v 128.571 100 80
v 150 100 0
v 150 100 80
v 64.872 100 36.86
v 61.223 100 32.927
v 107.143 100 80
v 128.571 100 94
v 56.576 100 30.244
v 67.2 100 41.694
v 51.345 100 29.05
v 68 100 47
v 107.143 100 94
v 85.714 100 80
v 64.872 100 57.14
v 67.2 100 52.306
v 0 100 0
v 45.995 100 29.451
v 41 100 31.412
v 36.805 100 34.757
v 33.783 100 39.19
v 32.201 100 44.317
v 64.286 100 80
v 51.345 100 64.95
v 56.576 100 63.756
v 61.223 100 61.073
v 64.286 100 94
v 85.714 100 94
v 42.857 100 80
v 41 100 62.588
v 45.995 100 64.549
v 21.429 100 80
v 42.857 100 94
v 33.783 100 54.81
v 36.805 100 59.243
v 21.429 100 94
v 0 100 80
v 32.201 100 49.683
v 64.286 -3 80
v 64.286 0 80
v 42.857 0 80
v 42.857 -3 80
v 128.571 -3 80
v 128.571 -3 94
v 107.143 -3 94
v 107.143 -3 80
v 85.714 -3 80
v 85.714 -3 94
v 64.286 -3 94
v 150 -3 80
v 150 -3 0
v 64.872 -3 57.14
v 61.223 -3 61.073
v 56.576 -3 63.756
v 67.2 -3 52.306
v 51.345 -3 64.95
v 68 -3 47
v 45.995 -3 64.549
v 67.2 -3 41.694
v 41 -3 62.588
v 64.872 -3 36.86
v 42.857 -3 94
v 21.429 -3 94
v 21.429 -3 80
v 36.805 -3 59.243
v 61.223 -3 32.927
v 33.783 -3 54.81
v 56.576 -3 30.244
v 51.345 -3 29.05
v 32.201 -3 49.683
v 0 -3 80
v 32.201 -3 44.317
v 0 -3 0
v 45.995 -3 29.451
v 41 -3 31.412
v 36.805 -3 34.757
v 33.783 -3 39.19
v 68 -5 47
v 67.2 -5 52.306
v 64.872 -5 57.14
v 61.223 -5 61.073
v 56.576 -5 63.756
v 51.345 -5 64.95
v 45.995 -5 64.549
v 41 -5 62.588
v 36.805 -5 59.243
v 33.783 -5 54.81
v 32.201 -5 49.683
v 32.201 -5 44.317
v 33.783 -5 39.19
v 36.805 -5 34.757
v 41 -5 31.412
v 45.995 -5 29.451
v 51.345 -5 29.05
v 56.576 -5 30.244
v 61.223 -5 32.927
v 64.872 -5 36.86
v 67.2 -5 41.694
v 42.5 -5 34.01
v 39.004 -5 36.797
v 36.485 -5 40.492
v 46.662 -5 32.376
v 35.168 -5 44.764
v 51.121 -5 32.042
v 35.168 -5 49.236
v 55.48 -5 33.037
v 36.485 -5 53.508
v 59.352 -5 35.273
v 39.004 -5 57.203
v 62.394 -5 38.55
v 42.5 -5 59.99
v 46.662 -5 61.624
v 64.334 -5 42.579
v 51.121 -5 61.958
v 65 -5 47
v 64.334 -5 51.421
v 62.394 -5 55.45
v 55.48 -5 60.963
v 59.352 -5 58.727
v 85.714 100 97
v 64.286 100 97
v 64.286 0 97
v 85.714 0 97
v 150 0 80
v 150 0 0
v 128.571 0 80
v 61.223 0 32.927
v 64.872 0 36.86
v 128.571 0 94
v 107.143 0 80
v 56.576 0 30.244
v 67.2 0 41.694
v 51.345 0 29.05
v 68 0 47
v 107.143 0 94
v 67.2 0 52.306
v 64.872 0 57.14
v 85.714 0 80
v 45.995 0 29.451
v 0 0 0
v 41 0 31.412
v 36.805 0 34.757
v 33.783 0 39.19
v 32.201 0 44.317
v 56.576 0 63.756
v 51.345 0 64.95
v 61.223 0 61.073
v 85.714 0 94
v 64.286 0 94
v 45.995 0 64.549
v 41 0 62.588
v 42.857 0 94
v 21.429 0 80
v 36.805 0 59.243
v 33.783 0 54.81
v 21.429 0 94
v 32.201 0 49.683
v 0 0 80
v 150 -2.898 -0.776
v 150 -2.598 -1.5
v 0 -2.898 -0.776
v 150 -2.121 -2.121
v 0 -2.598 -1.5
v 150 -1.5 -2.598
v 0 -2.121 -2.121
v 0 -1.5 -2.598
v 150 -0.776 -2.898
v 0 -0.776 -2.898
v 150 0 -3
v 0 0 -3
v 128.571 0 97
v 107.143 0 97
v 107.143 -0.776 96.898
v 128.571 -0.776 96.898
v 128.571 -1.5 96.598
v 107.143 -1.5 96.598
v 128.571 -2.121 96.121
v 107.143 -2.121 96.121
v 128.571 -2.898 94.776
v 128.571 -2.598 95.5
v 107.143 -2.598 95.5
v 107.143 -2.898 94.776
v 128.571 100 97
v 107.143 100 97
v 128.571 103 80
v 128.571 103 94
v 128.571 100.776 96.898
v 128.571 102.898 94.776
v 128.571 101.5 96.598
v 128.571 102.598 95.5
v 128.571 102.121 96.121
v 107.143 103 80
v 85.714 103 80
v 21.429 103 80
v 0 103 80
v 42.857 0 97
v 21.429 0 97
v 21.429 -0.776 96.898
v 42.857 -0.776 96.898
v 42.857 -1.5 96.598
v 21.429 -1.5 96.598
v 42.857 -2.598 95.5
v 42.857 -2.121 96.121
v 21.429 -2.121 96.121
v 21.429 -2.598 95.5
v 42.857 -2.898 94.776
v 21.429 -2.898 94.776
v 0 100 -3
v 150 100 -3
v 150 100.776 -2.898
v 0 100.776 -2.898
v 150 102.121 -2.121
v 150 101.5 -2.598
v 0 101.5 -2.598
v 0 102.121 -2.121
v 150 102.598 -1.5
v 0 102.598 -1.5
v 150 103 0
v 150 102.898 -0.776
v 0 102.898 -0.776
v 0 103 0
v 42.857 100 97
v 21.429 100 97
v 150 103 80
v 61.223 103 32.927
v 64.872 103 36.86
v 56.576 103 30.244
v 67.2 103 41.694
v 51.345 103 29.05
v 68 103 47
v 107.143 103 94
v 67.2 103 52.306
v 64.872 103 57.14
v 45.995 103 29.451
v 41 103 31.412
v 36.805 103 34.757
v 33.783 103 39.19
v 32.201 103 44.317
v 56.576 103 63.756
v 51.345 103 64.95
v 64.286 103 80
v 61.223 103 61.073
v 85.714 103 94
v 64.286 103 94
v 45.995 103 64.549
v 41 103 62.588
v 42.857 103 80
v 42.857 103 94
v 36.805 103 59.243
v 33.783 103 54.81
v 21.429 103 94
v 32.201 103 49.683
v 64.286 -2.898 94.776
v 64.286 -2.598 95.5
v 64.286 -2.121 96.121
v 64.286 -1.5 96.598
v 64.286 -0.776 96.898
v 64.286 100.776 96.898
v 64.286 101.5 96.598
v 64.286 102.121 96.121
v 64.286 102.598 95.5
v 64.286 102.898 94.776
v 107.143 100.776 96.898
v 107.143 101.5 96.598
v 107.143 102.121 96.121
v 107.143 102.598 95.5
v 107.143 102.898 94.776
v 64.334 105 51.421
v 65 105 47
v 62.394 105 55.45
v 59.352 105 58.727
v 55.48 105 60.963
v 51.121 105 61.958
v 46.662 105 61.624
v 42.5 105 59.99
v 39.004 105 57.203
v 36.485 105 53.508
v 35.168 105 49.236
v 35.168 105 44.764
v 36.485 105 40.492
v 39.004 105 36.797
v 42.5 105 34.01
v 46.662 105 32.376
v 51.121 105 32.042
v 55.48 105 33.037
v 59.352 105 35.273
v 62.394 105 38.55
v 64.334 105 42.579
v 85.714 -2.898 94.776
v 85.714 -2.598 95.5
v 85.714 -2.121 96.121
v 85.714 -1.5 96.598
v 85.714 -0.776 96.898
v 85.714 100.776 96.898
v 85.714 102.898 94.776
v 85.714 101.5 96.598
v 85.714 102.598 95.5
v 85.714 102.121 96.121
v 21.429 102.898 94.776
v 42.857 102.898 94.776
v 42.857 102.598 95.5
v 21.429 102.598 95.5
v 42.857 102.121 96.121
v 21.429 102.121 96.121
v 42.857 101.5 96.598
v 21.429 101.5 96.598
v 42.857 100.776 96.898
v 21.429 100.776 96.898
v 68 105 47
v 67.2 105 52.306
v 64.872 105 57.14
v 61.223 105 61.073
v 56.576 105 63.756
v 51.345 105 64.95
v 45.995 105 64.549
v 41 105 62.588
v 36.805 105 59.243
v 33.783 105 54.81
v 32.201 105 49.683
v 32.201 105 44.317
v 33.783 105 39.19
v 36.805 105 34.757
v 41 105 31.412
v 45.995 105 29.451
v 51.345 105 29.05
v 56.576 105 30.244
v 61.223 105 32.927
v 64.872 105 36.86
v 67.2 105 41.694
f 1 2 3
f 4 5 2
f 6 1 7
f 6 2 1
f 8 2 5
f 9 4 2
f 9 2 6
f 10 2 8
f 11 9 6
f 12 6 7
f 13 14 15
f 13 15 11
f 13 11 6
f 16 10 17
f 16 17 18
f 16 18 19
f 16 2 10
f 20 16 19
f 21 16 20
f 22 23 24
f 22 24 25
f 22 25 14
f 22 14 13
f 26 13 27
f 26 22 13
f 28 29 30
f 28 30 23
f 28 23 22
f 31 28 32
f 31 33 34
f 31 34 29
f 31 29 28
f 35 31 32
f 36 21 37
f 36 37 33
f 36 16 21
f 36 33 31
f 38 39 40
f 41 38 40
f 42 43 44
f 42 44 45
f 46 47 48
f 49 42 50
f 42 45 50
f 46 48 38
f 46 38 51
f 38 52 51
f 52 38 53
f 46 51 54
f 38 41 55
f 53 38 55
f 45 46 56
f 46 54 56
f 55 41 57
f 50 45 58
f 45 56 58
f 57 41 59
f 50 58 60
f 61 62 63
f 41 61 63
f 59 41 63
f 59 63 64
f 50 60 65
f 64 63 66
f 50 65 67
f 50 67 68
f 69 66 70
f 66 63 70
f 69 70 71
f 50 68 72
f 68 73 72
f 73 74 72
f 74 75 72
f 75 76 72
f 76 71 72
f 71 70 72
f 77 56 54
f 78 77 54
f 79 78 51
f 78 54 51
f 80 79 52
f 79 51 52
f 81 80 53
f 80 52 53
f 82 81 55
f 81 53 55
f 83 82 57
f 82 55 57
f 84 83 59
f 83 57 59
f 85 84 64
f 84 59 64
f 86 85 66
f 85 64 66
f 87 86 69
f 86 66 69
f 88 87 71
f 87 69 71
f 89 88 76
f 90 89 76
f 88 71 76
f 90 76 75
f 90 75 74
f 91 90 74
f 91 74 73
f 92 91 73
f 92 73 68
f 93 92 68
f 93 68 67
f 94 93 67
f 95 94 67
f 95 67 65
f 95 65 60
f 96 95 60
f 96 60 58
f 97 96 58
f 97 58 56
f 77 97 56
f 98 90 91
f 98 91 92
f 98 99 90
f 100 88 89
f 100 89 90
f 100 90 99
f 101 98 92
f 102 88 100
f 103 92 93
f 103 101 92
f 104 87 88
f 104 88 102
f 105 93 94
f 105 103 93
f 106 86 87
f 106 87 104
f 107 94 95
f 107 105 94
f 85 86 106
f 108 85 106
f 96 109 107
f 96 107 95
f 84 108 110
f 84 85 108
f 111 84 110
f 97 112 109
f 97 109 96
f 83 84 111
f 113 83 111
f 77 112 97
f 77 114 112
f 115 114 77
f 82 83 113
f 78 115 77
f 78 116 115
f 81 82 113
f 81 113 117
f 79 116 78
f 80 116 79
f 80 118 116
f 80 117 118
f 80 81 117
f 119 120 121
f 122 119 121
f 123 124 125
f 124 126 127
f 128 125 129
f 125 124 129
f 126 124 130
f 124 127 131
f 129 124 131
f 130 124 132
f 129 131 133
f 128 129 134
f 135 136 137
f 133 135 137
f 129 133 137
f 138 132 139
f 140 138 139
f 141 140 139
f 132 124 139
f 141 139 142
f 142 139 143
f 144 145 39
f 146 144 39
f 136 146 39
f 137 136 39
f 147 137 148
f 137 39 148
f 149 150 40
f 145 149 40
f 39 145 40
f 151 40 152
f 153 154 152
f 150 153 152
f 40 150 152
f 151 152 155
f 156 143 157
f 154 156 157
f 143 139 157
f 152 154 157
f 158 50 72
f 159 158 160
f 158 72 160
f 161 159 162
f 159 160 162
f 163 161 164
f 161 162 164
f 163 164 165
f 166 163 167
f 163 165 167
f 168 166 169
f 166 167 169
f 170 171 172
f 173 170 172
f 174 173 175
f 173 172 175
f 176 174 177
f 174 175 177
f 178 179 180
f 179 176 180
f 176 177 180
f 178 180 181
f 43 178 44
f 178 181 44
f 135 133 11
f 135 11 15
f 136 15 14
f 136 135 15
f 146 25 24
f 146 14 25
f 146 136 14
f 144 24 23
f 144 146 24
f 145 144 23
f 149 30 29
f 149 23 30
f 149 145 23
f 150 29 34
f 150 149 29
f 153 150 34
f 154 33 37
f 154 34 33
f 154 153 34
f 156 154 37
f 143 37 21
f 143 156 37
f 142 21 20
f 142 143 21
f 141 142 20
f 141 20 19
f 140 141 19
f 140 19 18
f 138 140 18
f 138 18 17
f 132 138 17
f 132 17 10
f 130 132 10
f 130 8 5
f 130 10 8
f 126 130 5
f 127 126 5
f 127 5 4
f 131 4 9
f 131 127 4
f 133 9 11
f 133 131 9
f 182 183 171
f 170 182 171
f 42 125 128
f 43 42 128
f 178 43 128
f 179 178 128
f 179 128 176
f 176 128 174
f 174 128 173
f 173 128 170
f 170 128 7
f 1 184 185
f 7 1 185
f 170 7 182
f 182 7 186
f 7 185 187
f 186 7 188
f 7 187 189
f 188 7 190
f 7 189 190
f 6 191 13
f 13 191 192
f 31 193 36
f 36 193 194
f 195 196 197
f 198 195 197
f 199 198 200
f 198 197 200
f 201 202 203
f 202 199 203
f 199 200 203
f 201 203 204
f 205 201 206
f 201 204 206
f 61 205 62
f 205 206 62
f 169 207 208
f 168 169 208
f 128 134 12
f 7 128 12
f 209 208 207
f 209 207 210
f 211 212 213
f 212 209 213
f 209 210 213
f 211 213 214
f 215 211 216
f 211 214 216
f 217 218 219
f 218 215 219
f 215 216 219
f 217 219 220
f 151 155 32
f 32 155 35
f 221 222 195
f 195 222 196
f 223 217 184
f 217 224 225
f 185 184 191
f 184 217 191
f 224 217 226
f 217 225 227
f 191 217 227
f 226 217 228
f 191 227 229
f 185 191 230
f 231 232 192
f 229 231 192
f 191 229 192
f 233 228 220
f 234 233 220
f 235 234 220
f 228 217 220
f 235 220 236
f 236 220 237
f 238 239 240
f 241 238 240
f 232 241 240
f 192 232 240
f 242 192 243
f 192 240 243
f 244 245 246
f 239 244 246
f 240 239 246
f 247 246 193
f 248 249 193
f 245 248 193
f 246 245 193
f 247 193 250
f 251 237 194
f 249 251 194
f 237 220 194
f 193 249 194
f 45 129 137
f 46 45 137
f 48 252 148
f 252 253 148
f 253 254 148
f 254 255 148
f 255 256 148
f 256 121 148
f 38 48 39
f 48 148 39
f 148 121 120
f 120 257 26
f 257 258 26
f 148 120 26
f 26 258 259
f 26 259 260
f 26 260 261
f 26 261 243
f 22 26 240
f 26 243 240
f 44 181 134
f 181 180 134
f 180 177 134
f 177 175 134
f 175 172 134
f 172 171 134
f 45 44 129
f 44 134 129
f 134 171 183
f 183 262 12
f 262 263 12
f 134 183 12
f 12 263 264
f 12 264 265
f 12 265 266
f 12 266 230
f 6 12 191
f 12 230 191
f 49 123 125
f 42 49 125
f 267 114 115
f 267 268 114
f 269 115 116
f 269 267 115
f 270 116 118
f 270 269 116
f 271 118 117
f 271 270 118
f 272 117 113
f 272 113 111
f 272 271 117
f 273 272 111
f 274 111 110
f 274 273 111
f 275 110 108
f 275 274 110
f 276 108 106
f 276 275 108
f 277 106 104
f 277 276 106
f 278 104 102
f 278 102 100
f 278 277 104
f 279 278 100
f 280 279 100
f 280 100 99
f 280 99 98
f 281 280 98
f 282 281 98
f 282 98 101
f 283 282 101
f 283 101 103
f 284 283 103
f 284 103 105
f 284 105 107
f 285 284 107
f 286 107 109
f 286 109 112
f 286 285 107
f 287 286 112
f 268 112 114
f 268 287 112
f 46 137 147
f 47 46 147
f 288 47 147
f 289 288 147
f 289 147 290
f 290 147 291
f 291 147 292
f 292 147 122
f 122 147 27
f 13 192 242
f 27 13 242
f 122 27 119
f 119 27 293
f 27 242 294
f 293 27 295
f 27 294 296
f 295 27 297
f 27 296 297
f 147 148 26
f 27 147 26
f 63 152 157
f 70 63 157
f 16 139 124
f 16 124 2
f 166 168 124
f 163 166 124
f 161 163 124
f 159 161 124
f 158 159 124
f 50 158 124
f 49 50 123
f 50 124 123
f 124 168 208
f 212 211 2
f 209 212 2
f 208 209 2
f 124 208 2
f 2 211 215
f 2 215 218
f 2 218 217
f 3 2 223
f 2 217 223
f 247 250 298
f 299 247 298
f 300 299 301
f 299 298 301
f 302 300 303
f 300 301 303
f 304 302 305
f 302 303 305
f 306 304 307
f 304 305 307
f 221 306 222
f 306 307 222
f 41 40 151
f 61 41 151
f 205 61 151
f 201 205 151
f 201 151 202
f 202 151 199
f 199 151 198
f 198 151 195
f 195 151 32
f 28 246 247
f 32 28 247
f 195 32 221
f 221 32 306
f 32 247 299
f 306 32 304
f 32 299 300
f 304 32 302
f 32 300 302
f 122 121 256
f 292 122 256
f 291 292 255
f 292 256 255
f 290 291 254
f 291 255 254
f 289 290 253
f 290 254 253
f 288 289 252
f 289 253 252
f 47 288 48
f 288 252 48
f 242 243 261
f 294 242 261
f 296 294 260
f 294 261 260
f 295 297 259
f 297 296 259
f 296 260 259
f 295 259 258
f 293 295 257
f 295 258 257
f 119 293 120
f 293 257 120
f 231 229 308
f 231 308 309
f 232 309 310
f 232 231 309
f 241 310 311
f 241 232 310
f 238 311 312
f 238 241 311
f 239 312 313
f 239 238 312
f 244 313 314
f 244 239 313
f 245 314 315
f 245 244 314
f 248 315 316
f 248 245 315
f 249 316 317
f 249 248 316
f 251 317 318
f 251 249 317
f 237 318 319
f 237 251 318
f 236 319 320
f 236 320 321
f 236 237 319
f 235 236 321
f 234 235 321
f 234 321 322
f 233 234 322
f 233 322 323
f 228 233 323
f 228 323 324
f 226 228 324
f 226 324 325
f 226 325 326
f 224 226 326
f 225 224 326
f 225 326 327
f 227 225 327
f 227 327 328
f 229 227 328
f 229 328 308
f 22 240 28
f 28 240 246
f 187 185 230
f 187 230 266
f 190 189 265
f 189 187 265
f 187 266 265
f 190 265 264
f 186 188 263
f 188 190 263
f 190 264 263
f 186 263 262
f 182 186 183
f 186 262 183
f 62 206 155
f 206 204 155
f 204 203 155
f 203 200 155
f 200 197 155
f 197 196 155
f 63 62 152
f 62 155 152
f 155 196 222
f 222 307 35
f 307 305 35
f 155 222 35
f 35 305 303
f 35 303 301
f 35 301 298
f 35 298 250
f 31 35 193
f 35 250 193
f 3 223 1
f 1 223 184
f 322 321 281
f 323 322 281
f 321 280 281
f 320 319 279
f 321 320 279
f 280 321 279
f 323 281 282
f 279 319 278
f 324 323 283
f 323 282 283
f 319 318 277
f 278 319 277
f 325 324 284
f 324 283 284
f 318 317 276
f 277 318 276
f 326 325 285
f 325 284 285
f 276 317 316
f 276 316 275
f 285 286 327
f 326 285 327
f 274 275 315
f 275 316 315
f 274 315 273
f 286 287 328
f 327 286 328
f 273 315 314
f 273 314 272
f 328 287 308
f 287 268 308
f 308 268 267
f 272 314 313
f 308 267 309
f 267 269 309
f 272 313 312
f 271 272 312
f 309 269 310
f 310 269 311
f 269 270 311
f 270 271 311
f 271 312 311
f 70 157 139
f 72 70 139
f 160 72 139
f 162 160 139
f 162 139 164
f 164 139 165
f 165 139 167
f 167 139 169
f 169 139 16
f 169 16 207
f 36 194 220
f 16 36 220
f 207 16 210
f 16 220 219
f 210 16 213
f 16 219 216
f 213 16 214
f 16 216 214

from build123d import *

# Parameters (mm, degrees)
F0_R          = 18
F0_W          = 150
F0_H          = 3
F2_DEPTH      = 110.5
F2_DEPTH_BACK = 4.9
F1_W          = 100
F1_H          = 94
F3_DEPTH      = 192.9
F0_R_2        = 15
F4_DEPTH      = 105
F4_DEPTH_BACK = 5


with BuildPart() as f2:
    # F0 (on Front) → F2 (new body, two sides)
    with BuildSketch(Plane.XZ) as f2_sk:
        Polygon((0, 80), (0, 0), (150, 0), (150, 80), (128.5714285714, 80), (128.5714285714, 103), (107.1428571429, 103), (107.1428571429, 80), (85.7142857143, 80), (85.7142857143, 103), (64.2857142857, 103), (64.2857142857, 80), (42.8571428571, 80), (42.8571428571, 103), (21.4285714286, 103), (21.4285714286, 80), align=None)
        with Locations((50, 47)):
            Circle(F0_R, mode=Mode.SUBTRACT)
        with Locations((75, -1.5)):
            Rectangle(F0_W, F0_H)
    extrude(amount=-F2_DEPTH)
    extrude(f2_sk.sketch, amount=F2_DEPTH_BACK)

    # F1 (on Right) → F3 (intersect)
    with BuildSketch(Plane.YZ):
        with BuildLine():
            Line((100, 97), (0, 97))
            ThreePointArc((0, 97), (-2.1213203436, 96.1213203436), (-3, 94))
            Line((-3, 94), (-3, 0))
            ThreePointArc((-3, 0), (-2.1213203436, -2.1213203436), (0, -3))
            Line((0, -3), (100, -3))
            ThreePointArc((100, -3), (102.1213203436, -2.1213203436), (103, 0))
            Line((103, 0), (103, 94))
            ThreePointArc((103, 94), (102.1213203436, 96.1213203436), (100, 97))
        make_face()
        with Locations((50, 47)):
            Rectangle(F1_W, F1_H, mode=Mode.SUBTRACT)
    extrude(amount=F3_DEPTH, mode=Mode.INTERSECT)

    # F0 (on Front) → F4 (join, two sides)
    with BuildSketch(Plane.XZ) as f4_sk:
        with Locations((50, 47)):
            Circle(F0_R)
        with Locations((50, 47)):
            Circle(F0_R_2, mode=Mode.SUBTRACT)
    extrude(amount=-F4_DEPTH)
    extrude(f4_sk.sketch, amount=F4_DEPTH_BACK)


solid = f2.part
